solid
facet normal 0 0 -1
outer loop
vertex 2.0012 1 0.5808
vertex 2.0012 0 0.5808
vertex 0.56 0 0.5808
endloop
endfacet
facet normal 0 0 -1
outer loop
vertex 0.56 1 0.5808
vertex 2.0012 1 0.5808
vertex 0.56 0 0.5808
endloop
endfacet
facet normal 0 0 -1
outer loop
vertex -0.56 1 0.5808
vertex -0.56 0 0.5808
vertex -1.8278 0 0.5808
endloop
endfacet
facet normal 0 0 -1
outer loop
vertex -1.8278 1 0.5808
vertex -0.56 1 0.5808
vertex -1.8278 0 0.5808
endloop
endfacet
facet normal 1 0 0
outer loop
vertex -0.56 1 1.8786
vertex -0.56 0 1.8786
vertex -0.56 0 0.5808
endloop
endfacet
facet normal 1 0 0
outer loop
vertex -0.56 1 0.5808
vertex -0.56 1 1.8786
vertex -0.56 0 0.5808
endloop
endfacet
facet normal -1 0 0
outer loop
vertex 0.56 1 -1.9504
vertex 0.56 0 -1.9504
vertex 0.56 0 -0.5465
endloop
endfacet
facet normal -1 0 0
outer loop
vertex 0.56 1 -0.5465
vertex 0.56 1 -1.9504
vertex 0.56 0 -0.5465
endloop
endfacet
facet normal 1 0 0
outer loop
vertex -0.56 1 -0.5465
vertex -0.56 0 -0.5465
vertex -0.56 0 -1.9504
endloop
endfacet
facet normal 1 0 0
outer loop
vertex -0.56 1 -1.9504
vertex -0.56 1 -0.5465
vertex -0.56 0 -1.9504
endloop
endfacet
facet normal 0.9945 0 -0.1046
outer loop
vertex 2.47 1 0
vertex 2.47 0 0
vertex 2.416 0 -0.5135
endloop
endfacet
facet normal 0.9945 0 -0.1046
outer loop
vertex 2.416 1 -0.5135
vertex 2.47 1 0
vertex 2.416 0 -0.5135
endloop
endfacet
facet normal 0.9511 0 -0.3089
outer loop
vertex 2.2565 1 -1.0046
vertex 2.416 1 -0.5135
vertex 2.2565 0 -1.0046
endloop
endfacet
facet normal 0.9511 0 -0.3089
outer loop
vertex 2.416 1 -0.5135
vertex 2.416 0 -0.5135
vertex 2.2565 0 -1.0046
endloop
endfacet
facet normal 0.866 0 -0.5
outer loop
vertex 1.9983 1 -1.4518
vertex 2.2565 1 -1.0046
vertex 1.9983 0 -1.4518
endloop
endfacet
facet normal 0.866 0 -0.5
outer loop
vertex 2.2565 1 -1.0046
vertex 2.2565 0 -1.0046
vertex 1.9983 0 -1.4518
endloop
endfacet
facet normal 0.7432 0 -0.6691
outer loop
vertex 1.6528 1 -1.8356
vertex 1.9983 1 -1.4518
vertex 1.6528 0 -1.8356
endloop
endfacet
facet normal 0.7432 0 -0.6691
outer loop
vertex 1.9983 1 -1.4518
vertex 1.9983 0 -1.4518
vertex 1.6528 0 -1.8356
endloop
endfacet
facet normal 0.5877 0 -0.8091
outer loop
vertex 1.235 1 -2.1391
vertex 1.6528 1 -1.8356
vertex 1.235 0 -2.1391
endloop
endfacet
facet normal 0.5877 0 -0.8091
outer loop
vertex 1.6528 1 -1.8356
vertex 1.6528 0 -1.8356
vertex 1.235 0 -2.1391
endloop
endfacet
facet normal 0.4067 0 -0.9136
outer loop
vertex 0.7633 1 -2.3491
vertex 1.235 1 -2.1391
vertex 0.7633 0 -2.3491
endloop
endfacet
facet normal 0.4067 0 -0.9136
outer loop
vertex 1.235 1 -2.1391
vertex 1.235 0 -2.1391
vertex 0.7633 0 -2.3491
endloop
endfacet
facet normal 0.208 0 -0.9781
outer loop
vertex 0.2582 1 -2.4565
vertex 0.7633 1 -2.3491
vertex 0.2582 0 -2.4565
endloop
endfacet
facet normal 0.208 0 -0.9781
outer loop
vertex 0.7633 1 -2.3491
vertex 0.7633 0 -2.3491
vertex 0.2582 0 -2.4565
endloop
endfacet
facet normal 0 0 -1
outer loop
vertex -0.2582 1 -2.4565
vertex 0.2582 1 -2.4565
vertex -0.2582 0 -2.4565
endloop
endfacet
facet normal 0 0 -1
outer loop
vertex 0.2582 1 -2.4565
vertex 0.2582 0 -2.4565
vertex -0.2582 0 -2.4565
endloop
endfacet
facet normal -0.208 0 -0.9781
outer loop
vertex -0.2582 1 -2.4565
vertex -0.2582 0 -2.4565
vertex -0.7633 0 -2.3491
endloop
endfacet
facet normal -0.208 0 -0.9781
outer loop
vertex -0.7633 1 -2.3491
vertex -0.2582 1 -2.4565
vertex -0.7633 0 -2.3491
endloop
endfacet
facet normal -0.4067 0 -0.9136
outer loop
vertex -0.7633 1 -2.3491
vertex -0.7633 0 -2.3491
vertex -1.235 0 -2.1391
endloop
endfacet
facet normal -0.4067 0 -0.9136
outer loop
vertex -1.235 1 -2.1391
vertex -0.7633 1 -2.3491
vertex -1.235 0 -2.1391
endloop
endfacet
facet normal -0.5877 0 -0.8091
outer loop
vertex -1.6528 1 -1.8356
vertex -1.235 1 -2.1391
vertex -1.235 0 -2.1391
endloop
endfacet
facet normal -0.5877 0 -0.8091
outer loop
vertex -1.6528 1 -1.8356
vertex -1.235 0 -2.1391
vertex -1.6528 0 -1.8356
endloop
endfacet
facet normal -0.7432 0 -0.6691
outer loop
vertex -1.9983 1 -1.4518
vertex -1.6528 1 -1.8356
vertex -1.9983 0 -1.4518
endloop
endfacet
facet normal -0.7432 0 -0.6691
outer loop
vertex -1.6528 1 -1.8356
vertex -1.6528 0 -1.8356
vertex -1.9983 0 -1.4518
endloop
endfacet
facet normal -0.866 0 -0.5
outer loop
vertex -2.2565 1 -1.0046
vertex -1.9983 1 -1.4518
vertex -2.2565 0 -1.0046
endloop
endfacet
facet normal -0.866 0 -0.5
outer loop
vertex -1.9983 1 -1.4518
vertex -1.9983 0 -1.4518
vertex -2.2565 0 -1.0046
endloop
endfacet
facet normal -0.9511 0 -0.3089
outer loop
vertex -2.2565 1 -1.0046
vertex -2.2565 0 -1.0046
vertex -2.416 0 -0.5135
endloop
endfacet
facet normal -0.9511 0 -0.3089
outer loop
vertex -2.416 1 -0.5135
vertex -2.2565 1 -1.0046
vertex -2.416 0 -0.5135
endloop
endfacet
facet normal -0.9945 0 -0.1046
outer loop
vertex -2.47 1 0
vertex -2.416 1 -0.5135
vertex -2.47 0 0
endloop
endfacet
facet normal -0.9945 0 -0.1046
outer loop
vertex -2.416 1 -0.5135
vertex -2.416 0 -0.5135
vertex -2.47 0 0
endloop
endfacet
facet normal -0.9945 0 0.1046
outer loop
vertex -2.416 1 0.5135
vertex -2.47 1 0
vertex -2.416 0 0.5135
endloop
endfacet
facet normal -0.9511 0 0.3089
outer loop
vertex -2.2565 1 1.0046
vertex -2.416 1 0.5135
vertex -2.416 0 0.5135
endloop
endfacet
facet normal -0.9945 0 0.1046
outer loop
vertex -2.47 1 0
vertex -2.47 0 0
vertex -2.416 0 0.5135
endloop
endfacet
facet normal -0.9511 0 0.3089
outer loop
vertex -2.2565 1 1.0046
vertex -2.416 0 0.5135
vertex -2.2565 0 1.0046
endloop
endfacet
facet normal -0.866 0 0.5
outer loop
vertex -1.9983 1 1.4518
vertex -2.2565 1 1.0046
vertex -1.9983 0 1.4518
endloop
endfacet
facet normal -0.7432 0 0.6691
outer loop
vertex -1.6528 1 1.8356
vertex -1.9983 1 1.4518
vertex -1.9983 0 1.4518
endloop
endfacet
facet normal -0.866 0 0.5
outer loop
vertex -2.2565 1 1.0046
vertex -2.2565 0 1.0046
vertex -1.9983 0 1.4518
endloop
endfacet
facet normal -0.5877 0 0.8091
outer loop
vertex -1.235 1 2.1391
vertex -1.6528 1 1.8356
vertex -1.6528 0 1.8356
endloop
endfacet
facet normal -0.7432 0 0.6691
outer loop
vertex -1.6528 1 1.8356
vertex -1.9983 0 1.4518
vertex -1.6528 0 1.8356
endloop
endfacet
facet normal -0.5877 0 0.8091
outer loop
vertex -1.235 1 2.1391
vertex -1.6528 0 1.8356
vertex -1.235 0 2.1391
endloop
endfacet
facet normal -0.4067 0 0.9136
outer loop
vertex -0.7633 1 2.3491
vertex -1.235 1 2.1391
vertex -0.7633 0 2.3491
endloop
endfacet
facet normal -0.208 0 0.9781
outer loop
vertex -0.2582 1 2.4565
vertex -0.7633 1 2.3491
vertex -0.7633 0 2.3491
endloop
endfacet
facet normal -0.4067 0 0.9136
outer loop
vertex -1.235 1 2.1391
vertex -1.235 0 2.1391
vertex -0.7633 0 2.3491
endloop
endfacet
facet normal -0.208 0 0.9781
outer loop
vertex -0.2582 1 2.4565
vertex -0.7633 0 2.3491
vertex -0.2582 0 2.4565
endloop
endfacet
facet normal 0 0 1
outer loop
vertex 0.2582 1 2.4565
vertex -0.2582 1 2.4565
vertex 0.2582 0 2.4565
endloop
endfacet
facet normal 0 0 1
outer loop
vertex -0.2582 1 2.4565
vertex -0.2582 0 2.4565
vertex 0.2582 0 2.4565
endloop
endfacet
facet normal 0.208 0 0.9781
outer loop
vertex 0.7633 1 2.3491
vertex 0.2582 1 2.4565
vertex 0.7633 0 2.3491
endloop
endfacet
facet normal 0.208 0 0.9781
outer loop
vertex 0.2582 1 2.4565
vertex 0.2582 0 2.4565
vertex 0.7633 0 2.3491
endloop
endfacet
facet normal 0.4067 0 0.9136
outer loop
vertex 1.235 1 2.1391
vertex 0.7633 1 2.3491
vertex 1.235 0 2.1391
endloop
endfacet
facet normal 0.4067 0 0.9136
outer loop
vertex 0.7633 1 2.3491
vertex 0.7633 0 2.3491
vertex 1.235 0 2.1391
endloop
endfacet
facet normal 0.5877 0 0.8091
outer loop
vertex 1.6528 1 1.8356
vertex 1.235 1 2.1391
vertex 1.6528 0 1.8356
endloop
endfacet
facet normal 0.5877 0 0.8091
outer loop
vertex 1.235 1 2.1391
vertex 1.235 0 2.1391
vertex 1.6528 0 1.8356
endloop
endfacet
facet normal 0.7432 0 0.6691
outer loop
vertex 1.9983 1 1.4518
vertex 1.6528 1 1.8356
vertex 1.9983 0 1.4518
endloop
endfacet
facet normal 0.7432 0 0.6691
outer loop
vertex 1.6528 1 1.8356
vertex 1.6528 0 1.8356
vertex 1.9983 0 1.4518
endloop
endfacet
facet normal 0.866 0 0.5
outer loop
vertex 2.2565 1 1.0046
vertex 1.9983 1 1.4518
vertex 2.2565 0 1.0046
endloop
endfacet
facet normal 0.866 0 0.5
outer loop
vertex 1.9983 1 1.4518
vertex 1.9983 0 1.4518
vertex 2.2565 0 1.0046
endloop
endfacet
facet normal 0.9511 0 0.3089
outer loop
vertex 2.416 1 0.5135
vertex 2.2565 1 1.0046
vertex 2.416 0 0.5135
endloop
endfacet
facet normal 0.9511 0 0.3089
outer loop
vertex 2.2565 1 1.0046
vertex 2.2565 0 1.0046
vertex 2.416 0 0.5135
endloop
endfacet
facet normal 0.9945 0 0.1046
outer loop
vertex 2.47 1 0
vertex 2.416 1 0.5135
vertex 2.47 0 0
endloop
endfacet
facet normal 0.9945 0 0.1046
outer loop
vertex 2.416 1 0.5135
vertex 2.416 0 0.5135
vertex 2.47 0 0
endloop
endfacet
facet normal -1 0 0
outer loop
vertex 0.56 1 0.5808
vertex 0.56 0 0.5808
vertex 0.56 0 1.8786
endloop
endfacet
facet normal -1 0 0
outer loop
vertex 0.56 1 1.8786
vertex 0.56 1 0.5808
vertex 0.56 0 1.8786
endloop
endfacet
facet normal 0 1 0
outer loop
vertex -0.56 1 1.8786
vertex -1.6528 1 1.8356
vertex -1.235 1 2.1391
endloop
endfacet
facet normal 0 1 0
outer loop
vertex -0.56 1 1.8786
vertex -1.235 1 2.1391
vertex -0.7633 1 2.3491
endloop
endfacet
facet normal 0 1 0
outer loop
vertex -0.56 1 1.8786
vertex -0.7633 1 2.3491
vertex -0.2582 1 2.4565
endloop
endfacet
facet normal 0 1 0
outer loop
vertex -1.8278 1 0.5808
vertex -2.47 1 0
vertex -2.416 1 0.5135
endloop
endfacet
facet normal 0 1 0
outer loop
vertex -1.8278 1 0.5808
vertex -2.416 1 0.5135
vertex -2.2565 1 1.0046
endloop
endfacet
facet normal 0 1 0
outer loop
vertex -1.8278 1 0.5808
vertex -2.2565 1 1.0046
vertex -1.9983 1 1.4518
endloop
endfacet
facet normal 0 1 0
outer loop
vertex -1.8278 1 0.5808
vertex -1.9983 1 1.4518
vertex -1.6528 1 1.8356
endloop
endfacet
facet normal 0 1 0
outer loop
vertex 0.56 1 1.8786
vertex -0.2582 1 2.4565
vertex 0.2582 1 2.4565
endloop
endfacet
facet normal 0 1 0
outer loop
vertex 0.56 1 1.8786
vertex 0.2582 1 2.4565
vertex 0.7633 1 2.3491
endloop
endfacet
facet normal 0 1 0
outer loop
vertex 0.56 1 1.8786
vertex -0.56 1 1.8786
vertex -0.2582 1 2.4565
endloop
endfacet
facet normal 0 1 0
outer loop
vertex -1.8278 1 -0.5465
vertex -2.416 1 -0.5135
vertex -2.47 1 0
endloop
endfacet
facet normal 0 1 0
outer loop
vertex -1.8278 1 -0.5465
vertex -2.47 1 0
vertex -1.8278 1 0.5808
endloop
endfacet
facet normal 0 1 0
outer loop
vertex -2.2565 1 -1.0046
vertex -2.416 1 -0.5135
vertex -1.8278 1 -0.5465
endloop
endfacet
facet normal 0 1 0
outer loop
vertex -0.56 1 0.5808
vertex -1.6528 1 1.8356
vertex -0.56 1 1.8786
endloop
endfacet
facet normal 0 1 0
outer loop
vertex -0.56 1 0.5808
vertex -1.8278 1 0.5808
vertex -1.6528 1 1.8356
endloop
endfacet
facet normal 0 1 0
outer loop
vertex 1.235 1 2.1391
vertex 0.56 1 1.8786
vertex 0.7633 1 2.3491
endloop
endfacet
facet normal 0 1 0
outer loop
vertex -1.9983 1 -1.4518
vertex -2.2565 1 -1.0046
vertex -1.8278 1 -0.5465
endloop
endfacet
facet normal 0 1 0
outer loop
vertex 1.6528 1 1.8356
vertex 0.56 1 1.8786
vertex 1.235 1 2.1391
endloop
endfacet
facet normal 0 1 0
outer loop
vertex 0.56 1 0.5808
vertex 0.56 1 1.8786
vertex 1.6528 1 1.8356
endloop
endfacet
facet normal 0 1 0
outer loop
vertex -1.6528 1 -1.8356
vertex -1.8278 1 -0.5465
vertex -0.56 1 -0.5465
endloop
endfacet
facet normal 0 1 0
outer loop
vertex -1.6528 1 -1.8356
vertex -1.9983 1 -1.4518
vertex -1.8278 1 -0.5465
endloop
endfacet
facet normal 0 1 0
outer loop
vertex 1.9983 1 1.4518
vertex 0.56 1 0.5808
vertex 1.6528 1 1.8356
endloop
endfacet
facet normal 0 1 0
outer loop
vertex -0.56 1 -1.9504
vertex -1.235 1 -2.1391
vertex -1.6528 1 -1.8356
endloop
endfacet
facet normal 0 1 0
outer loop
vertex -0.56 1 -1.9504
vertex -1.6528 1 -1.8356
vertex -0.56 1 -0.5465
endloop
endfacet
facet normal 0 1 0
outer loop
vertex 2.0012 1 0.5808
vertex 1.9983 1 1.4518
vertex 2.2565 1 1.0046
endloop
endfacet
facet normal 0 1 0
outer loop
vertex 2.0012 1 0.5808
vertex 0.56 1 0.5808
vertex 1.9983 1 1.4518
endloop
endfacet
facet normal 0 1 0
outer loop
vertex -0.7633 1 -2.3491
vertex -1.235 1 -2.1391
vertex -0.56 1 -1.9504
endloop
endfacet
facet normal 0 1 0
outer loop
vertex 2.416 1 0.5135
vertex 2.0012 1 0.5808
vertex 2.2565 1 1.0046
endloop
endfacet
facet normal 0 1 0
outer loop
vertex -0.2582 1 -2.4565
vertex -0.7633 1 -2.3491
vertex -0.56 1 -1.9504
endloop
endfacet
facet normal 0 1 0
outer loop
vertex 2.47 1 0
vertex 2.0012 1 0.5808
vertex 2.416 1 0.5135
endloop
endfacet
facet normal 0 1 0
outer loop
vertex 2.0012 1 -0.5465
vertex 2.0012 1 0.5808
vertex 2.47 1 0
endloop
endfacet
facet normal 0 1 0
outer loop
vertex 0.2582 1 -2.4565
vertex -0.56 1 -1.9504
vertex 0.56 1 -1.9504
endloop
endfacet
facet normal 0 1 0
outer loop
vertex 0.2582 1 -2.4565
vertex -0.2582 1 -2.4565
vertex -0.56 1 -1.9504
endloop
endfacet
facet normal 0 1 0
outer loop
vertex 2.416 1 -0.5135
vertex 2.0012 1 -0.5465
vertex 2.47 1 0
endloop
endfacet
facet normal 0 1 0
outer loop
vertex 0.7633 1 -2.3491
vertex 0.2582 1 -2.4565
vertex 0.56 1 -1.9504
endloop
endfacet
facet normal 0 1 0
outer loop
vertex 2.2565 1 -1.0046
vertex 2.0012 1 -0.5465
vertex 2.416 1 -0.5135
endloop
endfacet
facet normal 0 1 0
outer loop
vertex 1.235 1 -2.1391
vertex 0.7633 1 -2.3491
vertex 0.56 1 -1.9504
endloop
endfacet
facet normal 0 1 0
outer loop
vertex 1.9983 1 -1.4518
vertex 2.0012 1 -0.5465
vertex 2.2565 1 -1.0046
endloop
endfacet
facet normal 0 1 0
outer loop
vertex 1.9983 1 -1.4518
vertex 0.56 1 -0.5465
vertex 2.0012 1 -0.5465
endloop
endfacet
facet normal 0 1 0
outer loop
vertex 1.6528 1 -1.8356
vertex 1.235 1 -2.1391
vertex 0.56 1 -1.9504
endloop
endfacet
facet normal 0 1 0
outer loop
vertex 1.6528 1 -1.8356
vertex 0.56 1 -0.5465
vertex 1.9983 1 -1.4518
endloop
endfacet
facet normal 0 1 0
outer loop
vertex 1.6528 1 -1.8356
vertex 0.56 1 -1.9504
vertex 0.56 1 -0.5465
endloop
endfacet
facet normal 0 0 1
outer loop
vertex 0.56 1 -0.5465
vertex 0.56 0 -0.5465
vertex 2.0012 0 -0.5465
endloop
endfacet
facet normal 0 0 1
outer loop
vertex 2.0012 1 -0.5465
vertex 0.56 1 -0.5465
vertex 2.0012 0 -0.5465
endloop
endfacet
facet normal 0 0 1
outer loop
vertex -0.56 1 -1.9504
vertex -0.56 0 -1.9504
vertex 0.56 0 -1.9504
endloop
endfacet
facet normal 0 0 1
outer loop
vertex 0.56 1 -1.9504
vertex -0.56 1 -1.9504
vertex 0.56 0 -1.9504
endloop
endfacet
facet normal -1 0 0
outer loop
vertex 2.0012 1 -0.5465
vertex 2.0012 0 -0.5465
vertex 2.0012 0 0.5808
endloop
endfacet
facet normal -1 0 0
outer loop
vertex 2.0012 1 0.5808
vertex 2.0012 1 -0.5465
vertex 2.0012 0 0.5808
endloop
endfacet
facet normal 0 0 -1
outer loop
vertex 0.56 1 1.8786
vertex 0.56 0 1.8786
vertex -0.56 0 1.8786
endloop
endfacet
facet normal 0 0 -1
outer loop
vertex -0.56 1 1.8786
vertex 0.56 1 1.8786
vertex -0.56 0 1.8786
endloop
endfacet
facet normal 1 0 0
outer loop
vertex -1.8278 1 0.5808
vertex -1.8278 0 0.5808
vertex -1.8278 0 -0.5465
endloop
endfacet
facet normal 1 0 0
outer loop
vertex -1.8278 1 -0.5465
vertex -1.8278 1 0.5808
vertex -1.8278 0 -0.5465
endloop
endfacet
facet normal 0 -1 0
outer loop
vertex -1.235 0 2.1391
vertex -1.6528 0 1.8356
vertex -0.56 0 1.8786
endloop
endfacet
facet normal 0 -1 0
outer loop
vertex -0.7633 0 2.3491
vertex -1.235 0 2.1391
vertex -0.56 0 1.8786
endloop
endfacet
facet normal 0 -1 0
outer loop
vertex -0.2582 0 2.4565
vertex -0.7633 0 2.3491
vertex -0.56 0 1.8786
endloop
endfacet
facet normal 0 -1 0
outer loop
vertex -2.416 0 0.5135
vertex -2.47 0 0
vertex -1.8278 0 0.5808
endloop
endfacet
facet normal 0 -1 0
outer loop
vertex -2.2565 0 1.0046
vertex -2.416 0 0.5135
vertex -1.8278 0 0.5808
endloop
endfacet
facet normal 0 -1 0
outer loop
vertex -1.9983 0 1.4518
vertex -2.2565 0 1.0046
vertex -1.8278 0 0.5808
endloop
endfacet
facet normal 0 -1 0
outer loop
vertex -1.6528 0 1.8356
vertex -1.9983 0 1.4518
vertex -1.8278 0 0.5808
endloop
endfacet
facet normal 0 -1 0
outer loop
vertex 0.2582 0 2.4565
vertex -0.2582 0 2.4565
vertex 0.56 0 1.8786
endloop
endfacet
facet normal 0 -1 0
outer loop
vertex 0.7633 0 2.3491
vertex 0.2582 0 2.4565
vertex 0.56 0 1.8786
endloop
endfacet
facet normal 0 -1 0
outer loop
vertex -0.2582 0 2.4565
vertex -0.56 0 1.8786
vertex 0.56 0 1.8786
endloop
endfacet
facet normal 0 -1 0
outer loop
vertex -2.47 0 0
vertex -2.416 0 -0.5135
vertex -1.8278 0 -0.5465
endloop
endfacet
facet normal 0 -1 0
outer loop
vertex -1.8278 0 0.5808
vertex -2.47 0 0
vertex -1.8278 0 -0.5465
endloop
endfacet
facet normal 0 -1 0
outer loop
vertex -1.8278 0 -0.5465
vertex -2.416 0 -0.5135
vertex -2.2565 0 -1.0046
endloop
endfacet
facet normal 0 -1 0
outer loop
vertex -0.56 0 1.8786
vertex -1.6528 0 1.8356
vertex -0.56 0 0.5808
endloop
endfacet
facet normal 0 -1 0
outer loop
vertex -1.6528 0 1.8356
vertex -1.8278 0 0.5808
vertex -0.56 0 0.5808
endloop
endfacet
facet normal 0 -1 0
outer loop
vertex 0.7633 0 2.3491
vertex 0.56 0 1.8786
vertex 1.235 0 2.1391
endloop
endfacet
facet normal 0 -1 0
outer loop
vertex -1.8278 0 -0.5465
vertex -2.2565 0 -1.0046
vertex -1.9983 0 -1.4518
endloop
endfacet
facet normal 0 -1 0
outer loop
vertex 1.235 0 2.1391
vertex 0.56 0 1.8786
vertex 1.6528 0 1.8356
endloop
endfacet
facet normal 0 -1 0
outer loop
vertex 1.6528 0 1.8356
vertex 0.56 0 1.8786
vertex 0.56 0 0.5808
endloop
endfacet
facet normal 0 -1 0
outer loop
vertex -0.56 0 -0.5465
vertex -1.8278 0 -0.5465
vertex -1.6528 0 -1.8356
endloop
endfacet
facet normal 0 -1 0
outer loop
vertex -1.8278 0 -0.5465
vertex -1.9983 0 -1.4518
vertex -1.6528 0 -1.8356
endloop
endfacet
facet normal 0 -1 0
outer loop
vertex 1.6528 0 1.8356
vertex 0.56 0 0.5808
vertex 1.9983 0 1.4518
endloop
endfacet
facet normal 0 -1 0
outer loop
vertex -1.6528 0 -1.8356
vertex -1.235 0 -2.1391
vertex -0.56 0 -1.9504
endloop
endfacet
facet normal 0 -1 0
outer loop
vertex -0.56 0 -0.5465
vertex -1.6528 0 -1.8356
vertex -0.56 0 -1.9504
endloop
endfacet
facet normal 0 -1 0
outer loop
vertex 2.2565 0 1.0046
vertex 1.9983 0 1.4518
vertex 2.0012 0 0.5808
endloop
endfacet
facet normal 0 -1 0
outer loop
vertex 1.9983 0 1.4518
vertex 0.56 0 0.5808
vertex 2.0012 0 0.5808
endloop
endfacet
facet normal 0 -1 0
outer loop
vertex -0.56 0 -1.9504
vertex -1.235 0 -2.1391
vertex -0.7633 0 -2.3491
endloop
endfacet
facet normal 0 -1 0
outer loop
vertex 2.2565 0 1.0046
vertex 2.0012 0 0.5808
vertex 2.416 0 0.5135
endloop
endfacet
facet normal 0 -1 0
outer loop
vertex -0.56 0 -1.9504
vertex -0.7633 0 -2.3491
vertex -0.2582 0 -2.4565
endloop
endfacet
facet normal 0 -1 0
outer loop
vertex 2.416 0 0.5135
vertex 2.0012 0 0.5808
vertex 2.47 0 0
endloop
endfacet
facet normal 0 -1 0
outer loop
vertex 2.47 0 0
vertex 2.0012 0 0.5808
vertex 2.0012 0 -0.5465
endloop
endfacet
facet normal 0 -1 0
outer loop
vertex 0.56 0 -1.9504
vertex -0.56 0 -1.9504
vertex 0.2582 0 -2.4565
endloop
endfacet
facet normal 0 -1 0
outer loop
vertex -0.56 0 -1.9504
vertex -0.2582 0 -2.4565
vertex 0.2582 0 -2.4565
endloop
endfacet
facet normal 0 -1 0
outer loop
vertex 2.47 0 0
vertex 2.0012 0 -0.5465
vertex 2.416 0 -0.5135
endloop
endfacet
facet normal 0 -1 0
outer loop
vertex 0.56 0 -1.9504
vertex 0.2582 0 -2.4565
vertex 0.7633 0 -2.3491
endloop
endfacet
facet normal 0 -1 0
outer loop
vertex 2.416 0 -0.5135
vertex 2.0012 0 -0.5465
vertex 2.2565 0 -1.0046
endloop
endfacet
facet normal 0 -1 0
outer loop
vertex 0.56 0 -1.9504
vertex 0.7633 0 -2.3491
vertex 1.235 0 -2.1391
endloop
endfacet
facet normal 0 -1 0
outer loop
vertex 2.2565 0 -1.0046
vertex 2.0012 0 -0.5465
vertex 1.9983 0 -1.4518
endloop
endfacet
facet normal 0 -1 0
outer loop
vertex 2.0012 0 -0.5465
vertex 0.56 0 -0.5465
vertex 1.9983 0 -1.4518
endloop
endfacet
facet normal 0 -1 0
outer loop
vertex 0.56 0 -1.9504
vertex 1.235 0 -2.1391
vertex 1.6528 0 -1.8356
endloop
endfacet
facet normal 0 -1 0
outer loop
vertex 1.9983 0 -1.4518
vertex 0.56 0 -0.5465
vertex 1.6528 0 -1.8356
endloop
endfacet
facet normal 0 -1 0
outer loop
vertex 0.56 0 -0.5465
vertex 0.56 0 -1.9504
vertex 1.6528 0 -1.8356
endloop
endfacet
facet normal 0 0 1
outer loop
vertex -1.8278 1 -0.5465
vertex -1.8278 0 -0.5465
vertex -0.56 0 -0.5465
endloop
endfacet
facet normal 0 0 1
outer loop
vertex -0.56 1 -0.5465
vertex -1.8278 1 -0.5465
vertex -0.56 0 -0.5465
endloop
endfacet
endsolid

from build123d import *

# Parameters (mm, degrees)
SKETCH1_R           = 2.47
BOSS_EXTRUDE1_DEPTH = 1


with BuildPart() as part:
    # Sketch1 → Boss-Extrude1 (new body)
    with BuildSketch(Plane(origin=(0, 0, 0), x_dir=(1, 0, 0), z_dir=(0, 1, 0))):
        Circle(SKETCH1_R)
        Polygon((-1.827803458, -0.580830581), (-1.827803458, 0.546492653), (-0.56, 0.546492653), (-0.56, 1.950438827), (0.56, 1.950438827), (0.56, 0.546492653), (2.001200092, 0.546492653), (2.001200092, -0.580830581), (0.56, -0.580830581), (0.56, -1.878564728), (-0.56, -1.878564728), (-0.56, -0.580830581), align=None, mode=Mode.SUBTRACT)
    extrude(amount=BOSS_EXTRUDE1_DEPTH)


solid = part.part
